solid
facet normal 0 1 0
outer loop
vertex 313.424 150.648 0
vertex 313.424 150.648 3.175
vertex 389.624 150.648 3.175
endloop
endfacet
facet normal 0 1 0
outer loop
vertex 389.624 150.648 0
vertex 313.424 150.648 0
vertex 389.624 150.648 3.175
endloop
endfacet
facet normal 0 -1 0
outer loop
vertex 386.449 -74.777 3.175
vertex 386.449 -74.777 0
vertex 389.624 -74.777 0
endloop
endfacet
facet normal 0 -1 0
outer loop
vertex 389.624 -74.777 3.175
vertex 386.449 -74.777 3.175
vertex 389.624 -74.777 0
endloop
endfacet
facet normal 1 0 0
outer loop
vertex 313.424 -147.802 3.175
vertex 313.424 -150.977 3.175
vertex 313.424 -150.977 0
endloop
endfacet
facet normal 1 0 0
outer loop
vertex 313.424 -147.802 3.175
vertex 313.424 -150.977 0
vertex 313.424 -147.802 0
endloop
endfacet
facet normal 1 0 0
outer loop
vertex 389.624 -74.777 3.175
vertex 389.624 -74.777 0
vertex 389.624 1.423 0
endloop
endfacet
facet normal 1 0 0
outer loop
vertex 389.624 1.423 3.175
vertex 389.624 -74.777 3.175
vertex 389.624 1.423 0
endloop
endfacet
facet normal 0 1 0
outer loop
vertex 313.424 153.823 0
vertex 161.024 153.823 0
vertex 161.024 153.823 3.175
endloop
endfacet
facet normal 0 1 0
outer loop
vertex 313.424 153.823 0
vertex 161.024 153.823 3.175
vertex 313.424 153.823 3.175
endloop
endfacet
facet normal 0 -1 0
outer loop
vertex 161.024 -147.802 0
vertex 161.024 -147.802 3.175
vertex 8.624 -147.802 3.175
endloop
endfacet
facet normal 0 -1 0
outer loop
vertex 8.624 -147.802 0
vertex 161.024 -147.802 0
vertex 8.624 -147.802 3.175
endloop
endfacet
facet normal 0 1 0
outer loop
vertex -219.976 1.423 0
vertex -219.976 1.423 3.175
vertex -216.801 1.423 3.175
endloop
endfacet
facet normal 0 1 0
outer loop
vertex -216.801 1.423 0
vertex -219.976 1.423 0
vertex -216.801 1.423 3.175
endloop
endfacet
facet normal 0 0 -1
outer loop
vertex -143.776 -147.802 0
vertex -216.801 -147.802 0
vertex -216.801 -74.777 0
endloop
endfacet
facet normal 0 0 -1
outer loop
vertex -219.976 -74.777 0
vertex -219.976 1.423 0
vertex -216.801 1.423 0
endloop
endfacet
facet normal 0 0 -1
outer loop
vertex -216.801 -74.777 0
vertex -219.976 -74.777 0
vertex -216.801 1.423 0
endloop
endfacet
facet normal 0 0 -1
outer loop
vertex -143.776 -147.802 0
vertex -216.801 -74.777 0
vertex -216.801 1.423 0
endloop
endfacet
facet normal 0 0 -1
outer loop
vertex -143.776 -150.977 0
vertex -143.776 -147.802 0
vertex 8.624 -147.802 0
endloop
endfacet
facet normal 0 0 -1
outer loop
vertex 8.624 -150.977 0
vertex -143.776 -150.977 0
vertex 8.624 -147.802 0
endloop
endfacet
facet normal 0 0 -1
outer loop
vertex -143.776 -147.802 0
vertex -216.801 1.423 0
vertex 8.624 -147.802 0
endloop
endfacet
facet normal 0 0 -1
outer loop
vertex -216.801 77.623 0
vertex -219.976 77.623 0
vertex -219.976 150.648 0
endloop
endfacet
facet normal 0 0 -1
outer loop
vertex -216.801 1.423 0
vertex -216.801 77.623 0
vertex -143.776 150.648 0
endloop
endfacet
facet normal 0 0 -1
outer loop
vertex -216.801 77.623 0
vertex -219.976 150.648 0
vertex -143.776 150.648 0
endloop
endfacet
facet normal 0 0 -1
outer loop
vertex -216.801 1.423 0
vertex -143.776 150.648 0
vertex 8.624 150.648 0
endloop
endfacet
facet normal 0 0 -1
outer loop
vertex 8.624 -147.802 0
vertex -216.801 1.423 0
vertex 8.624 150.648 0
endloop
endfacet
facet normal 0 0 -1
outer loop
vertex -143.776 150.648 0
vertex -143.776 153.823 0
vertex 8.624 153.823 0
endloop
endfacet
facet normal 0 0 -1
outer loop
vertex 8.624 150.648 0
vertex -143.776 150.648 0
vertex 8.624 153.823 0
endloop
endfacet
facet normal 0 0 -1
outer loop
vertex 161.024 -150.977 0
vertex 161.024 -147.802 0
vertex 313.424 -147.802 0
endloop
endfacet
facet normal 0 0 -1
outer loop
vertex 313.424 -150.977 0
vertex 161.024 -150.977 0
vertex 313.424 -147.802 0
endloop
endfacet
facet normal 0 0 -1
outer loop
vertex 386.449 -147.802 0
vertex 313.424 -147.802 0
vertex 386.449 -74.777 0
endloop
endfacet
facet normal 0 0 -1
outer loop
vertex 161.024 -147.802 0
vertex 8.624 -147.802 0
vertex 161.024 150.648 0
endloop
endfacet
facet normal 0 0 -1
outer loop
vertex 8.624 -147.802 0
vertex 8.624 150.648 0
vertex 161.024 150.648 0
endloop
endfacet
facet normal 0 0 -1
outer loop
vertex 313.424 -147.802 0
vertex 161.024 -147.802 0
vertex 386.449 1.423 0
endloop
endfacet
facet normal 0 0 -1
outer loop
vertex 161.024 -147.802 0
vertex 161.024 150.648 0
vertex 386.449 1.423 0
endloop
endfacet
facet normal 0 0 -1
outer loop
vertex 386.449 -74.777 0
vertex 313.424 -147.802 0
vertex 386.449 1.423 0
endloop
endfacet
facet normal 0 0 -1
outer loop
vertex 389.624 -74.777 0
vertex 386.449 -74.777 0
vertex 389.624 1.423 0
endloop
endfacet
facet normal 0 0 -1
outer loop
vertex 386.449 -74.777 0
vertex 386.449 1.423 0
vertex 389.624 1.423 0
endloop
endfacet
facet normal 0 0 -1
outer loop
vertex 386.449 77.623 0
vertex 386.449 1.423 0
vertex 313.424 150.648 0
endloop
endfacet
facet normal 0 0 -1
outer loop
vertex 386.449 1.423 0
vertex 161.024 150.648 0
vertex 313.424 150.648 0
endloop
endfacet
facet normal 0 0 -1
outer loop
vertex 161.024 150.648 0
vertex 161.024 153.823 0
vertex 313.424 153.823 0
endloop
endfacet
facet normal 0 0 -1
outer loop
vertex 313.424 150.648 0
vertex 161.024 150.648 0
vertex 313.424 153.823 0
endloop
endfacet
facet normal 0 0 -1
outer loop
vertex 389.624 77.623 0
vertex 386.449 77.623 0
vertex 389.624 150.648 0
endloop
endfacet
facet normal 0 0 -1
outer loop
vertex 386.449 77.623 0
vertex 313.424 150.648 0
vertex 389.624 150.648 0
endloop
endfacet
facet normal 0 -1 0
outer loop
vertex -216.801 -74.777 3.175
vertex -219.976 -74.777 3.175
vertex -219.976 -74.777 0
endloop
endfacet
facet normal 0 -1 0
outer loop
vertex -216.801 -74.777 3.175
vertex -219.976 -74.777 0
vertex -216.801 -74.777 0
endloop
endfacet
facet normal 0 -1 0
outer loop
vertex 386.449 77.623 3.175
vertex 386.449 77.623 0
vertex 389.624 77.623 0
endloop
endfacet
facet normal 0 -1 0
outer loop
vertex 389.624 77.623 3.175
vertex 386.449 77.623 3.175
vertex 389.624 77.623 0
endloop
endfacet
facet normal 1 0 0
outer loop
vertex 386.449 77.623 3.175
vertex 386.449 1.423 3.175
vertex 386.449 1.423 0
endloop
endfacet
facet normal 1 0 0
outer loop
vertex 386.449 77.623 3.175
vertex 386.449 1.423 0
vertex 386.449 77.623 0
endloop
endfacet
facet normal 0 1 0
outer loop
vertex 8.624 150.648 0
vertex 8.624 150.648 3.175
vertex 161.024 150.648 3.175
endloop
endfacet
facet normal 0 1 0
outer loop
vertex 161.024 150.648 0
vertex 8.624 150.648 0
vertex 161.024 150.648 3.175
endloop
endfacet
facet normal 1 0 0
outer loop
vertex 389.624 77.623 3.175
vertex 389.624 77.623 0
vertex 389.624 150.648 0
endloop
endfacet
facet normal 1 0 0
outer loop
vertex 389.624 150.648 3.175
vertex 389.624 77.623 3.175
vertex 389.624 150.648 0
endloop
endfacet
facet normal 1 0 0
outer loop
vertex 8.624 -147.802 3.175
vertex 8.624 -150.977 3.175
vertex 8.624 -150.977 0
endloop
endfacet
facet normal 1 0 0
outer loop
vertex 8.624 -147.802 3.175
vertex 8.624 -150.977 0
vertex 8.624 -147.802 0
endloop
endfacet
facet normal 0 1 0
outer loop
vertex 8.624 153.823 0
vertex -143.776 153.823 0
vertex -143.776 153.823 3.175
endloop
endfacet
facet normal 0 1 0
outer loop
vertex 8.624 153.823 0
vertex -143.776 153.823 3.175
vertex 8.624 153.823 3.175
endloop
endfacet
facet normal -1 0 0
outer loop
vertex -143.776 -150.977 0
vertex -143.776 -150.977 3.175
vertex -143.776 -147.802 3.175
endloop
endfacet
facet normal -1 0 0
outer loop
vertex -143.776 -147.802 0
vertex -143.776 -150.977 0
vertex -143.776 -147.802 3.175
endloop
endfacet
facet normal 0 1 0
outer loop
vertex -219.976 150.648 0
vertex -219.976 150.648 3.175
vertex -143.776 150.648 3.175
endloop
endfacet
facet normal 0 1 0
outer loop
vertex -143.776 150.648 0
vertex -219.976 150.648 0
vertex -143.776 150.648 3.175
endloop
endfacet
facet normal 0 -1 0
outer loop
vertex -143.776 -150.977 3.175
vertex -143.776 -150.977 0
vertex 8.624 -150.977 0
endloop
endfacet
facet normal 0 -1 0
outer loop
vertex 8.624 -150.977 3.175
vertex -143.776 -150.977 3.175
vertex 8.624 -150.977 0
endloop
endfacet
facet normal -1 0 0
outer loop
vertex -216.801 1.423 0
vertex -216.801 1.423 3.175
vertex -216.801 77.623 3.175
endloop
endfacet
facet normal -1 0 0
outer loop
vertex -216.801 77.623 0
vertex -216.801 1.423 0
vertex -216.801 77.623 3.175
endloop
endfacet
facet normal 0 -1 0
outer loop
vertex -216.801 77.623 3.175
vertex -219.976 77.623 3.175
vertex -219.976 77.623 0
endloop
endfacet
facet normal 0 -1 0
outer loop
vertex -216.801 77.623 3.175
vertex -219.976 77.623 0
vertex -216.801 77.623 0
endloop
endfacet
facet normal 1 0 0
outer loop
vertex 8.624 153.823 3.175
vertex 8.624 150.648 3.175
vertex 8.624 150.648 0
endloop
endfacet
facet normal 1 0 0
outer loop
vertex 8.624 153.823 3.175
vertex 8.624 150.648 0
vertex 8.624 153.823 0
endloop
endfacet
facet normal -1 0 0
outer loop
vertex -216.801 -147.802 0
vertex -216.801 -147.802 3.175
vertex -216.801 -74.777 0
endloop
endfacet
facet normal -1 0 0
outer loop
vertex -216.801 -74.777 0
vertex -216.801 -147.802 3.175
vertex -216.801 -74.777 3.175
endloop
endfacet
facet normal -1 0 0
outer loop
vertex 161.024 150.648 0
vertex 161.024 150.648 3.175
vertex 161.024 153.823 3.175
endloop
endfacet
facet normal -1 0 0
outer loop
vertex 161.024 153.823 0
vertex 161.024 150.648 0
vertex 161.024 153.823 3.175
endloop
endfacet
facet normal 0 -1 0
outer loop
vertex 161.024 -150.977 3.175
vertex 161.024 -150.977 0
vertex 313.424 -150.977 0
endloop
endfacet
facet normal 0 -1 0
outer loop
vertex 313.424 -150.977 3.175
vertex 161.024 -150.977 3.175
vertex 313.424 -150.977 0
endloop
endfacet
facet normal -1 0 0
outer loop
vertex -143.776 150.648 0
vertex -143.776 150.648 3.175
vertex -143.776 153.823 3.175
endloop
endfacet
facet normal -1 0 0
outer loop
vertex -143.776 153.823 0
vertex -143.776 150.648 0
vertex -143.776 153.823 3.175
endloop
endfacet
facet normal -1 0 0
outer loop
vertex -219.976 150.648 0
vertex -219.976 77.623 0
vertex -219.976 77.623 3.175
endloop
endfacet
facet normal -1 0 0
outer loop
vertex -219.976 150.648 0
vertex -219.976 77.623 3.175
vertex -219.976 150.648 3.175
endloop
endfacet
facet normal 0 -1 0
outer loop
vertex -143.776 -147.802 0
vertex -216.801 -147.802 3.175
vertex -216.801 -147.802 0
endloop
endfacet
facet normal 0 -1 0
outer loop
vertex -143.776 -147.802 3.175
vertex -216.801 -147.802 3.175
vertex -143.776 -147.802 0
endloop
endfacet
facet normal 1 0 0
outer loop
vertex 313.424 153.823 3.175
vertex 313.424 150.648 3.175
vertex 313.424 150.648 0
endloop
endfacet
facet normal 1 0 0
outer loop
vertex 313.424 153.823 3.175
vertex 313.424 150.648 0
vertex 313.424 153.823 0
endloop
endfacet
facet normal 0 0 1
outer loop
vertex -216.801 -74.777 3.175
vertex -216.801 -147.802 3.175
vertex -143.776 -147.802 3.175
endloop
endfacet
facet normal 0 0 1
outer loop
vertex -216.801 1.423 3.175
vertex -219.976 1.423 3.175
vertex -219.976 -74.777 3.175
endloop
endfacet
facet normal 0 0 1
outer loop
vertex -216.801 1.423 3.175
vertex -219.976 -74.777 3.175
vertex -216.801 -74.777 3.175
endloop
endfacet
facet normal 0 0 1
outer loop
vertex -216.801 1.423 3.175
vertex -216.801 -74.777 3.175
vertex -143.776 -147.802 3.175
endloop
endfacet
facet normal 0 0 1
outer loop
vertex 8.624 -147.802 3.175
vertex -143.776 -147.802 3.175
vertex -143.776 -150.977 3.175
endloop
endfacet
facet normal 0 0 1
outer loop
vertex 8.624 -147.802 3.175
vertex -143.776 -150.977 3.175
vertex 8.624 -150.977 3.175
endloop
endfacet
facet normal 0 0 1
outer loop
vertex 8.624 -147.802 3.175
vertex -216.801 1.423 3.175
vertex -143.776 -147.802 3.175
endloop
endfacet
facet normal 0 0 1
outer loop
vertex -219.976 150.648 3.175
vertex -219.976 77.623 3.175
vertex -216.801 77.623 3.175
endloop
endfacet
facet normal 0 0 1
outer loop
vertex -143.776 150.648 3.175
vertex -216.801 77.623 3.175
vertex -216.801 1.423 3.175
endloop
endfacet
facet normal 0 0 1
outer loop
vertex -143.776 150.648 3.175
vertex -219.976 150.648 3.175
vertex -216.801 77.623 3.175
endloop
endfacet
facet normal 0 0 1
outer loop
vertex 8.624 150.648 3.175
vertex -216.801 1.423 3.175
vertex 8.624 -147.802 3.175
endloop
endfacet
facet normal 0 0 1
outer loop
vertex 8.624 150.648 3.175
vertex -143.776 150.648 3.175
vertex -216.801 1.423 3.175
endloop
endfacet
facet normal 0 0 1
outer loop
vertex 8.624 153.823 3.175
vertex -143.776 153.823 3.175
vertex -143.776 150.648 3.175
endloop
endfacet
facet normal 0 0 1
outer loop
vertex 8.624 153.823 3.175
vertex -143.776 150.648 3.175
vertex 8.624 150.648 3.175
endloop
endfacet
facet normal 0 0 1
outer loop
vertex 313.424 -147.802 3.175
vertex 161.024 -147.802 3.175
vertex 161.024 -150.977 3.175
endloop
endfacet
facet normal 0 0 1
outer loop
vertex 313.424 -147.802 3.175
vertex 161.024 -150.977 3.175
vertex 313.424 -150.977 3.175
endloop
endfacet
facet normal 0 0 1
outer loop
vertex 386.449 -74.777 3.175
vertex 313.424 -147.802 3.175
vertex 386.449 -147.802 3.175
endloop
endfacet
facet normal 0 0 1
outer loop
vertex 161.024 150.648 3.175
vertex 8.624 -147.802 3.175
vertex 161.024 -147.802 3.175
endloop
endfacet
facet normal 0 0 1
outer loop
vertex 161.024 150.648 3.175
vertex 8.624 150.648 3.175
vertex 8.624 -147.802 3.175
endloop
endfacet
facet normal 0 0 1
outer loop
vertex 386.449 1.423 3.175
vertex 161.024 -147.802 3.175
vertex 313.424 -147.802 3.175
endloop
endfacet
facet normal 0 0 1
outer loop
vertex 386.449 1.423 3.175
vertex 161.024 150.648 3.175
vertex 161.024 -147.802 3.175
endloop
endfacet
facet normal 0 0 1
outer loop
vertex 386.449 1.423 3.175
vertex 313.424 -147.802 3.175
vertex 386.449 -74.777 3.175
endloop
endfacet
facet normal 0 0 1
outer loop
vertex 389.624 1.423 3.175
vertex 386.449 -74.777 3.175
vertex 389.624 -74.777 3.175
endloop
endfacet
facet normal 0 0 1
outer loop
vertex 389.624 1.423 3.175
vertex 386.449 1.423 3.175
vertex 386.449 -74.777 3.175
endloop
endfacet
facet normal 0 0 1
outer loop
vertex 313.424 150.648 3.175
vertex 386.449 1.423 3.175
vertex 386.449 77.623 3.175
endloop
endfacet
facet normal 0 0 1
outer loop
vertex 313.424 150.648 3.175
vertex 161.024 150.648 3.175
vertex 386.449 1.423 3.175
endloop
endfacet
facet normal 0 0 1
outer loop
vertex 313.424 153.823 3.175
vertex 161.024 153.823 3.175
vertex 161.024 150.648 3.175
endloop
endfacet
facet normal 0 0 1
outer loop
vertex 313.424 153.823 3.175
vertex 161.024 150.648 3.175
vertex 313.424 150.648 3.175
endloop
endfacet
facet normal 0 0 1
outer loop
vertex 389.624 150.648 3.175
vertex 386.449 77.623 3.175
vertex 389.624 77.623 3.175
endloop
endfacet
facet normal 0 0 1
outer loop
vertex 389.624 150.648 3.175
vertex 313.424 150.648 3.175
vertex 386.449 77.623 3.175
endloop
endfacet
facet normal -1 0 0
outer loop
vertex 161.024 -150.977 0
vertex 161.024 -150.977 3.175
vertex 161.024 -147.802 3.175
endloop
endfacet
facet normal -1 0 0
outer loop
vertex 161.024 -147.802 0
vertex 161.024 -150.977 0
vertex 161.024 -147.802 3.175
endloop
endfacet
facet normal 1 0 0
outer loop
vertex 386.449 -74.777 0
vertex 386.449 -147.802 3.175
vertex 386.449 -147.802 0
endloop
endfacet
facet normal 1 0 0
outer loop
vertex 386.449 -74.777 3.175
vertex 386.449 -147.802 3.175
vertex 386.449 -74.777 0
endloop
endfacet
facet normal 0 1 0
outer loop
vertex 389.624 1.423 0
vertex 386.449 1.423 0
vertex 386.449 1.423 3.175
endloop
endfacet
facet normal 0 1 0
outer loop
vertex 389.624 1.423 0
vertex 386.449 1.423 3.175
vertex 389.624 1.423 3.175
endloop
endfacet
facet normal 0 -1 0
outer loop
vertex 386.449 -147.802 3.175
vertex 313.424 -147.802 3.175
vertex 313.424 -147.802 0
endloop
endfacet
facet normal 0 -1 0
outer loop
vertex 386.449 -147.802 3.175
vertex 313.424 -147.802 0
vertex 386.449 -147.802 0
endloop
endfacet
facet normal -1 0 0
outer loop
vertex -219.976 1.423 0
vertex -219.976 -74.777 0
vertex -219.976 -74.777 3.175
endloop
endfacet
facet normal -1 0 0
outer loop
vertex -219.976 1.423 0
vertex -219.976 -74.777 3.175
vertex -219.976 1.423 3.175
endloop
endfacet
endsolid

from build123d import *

# Parameters (mm, degrees)
F0_W     = 609.6
F0_H     = 304.8
F1_DEPTH = 3.175
F2_W     = 76.2
F2_H     = 3.175
F3_DEPTH = 3.176
F4_W     = 3.175
F4_H     = 76.2
F4_H_2   = 73.025
F5_DEPTH = 3.176


with BuildPart() as f1:
    # F0 (on Top) → F1 (new body)
    with BuildSketch(Plane.XY):
        with Locations((84.824273, 1.423104)):
            Rectangle(F0_W, F0_H)
    extrude(amount=F1_DEPTH)

    # F2 (on face) → F3 (cut, through all)
    with BuildSketch(Plane.XY.offset(3.175)):
        with Locations((-181.875727, 152.235604)):
            Rectangle(F2_W, F2_H)
        with Locations((351.524273, 152.235604)):
            Rectangle(F2_W, F2_H)
        with Locations((-181.875727, -149.389396)):
            Rectangle(F2_W, F2_H)
        with Locations((351.524273, -149.389396)):
            Rectangle(F2_W, F2_H)
        with Locations((46.724273, 152.235604)):
            Rectangle(F2_W, F2_H)
        with Locations((122.924273, 152.235604)):
            Rectangle(F2_W, F2_H)
        with Locations((46.724273, -149.389396)):
            Rectangle(F2_W, F2_H)
        with Locations((122.924273, -149.389396)):
            Rectangle(F2_W, F2_H)
    extrude(amount=-F3_DEPTH, mode=Mode.SUBTRACT)

    # F4 (on face) → F5 (cut, through all)
    with BuildSketch(Plane.XY.offset(3.175)):
        with Locations((388.036773, 39.523104)):
            Rectangle(F4_W, F4_H)
        with Locations((388.036773, -111.289396)):
            Rectangle(F4_W, F4_H_2)
        with Locations((-218.388227, -111.289396)):
            Rectangle(F4_W, F4_H_2)
        with Locations((-218.388227, 39.523104)):
            Rectangle(F4_W, F4_H)
    extrude(amount=-F5_DEPTH, mode=Mode.SUBTRACT)


solid = f1.part
